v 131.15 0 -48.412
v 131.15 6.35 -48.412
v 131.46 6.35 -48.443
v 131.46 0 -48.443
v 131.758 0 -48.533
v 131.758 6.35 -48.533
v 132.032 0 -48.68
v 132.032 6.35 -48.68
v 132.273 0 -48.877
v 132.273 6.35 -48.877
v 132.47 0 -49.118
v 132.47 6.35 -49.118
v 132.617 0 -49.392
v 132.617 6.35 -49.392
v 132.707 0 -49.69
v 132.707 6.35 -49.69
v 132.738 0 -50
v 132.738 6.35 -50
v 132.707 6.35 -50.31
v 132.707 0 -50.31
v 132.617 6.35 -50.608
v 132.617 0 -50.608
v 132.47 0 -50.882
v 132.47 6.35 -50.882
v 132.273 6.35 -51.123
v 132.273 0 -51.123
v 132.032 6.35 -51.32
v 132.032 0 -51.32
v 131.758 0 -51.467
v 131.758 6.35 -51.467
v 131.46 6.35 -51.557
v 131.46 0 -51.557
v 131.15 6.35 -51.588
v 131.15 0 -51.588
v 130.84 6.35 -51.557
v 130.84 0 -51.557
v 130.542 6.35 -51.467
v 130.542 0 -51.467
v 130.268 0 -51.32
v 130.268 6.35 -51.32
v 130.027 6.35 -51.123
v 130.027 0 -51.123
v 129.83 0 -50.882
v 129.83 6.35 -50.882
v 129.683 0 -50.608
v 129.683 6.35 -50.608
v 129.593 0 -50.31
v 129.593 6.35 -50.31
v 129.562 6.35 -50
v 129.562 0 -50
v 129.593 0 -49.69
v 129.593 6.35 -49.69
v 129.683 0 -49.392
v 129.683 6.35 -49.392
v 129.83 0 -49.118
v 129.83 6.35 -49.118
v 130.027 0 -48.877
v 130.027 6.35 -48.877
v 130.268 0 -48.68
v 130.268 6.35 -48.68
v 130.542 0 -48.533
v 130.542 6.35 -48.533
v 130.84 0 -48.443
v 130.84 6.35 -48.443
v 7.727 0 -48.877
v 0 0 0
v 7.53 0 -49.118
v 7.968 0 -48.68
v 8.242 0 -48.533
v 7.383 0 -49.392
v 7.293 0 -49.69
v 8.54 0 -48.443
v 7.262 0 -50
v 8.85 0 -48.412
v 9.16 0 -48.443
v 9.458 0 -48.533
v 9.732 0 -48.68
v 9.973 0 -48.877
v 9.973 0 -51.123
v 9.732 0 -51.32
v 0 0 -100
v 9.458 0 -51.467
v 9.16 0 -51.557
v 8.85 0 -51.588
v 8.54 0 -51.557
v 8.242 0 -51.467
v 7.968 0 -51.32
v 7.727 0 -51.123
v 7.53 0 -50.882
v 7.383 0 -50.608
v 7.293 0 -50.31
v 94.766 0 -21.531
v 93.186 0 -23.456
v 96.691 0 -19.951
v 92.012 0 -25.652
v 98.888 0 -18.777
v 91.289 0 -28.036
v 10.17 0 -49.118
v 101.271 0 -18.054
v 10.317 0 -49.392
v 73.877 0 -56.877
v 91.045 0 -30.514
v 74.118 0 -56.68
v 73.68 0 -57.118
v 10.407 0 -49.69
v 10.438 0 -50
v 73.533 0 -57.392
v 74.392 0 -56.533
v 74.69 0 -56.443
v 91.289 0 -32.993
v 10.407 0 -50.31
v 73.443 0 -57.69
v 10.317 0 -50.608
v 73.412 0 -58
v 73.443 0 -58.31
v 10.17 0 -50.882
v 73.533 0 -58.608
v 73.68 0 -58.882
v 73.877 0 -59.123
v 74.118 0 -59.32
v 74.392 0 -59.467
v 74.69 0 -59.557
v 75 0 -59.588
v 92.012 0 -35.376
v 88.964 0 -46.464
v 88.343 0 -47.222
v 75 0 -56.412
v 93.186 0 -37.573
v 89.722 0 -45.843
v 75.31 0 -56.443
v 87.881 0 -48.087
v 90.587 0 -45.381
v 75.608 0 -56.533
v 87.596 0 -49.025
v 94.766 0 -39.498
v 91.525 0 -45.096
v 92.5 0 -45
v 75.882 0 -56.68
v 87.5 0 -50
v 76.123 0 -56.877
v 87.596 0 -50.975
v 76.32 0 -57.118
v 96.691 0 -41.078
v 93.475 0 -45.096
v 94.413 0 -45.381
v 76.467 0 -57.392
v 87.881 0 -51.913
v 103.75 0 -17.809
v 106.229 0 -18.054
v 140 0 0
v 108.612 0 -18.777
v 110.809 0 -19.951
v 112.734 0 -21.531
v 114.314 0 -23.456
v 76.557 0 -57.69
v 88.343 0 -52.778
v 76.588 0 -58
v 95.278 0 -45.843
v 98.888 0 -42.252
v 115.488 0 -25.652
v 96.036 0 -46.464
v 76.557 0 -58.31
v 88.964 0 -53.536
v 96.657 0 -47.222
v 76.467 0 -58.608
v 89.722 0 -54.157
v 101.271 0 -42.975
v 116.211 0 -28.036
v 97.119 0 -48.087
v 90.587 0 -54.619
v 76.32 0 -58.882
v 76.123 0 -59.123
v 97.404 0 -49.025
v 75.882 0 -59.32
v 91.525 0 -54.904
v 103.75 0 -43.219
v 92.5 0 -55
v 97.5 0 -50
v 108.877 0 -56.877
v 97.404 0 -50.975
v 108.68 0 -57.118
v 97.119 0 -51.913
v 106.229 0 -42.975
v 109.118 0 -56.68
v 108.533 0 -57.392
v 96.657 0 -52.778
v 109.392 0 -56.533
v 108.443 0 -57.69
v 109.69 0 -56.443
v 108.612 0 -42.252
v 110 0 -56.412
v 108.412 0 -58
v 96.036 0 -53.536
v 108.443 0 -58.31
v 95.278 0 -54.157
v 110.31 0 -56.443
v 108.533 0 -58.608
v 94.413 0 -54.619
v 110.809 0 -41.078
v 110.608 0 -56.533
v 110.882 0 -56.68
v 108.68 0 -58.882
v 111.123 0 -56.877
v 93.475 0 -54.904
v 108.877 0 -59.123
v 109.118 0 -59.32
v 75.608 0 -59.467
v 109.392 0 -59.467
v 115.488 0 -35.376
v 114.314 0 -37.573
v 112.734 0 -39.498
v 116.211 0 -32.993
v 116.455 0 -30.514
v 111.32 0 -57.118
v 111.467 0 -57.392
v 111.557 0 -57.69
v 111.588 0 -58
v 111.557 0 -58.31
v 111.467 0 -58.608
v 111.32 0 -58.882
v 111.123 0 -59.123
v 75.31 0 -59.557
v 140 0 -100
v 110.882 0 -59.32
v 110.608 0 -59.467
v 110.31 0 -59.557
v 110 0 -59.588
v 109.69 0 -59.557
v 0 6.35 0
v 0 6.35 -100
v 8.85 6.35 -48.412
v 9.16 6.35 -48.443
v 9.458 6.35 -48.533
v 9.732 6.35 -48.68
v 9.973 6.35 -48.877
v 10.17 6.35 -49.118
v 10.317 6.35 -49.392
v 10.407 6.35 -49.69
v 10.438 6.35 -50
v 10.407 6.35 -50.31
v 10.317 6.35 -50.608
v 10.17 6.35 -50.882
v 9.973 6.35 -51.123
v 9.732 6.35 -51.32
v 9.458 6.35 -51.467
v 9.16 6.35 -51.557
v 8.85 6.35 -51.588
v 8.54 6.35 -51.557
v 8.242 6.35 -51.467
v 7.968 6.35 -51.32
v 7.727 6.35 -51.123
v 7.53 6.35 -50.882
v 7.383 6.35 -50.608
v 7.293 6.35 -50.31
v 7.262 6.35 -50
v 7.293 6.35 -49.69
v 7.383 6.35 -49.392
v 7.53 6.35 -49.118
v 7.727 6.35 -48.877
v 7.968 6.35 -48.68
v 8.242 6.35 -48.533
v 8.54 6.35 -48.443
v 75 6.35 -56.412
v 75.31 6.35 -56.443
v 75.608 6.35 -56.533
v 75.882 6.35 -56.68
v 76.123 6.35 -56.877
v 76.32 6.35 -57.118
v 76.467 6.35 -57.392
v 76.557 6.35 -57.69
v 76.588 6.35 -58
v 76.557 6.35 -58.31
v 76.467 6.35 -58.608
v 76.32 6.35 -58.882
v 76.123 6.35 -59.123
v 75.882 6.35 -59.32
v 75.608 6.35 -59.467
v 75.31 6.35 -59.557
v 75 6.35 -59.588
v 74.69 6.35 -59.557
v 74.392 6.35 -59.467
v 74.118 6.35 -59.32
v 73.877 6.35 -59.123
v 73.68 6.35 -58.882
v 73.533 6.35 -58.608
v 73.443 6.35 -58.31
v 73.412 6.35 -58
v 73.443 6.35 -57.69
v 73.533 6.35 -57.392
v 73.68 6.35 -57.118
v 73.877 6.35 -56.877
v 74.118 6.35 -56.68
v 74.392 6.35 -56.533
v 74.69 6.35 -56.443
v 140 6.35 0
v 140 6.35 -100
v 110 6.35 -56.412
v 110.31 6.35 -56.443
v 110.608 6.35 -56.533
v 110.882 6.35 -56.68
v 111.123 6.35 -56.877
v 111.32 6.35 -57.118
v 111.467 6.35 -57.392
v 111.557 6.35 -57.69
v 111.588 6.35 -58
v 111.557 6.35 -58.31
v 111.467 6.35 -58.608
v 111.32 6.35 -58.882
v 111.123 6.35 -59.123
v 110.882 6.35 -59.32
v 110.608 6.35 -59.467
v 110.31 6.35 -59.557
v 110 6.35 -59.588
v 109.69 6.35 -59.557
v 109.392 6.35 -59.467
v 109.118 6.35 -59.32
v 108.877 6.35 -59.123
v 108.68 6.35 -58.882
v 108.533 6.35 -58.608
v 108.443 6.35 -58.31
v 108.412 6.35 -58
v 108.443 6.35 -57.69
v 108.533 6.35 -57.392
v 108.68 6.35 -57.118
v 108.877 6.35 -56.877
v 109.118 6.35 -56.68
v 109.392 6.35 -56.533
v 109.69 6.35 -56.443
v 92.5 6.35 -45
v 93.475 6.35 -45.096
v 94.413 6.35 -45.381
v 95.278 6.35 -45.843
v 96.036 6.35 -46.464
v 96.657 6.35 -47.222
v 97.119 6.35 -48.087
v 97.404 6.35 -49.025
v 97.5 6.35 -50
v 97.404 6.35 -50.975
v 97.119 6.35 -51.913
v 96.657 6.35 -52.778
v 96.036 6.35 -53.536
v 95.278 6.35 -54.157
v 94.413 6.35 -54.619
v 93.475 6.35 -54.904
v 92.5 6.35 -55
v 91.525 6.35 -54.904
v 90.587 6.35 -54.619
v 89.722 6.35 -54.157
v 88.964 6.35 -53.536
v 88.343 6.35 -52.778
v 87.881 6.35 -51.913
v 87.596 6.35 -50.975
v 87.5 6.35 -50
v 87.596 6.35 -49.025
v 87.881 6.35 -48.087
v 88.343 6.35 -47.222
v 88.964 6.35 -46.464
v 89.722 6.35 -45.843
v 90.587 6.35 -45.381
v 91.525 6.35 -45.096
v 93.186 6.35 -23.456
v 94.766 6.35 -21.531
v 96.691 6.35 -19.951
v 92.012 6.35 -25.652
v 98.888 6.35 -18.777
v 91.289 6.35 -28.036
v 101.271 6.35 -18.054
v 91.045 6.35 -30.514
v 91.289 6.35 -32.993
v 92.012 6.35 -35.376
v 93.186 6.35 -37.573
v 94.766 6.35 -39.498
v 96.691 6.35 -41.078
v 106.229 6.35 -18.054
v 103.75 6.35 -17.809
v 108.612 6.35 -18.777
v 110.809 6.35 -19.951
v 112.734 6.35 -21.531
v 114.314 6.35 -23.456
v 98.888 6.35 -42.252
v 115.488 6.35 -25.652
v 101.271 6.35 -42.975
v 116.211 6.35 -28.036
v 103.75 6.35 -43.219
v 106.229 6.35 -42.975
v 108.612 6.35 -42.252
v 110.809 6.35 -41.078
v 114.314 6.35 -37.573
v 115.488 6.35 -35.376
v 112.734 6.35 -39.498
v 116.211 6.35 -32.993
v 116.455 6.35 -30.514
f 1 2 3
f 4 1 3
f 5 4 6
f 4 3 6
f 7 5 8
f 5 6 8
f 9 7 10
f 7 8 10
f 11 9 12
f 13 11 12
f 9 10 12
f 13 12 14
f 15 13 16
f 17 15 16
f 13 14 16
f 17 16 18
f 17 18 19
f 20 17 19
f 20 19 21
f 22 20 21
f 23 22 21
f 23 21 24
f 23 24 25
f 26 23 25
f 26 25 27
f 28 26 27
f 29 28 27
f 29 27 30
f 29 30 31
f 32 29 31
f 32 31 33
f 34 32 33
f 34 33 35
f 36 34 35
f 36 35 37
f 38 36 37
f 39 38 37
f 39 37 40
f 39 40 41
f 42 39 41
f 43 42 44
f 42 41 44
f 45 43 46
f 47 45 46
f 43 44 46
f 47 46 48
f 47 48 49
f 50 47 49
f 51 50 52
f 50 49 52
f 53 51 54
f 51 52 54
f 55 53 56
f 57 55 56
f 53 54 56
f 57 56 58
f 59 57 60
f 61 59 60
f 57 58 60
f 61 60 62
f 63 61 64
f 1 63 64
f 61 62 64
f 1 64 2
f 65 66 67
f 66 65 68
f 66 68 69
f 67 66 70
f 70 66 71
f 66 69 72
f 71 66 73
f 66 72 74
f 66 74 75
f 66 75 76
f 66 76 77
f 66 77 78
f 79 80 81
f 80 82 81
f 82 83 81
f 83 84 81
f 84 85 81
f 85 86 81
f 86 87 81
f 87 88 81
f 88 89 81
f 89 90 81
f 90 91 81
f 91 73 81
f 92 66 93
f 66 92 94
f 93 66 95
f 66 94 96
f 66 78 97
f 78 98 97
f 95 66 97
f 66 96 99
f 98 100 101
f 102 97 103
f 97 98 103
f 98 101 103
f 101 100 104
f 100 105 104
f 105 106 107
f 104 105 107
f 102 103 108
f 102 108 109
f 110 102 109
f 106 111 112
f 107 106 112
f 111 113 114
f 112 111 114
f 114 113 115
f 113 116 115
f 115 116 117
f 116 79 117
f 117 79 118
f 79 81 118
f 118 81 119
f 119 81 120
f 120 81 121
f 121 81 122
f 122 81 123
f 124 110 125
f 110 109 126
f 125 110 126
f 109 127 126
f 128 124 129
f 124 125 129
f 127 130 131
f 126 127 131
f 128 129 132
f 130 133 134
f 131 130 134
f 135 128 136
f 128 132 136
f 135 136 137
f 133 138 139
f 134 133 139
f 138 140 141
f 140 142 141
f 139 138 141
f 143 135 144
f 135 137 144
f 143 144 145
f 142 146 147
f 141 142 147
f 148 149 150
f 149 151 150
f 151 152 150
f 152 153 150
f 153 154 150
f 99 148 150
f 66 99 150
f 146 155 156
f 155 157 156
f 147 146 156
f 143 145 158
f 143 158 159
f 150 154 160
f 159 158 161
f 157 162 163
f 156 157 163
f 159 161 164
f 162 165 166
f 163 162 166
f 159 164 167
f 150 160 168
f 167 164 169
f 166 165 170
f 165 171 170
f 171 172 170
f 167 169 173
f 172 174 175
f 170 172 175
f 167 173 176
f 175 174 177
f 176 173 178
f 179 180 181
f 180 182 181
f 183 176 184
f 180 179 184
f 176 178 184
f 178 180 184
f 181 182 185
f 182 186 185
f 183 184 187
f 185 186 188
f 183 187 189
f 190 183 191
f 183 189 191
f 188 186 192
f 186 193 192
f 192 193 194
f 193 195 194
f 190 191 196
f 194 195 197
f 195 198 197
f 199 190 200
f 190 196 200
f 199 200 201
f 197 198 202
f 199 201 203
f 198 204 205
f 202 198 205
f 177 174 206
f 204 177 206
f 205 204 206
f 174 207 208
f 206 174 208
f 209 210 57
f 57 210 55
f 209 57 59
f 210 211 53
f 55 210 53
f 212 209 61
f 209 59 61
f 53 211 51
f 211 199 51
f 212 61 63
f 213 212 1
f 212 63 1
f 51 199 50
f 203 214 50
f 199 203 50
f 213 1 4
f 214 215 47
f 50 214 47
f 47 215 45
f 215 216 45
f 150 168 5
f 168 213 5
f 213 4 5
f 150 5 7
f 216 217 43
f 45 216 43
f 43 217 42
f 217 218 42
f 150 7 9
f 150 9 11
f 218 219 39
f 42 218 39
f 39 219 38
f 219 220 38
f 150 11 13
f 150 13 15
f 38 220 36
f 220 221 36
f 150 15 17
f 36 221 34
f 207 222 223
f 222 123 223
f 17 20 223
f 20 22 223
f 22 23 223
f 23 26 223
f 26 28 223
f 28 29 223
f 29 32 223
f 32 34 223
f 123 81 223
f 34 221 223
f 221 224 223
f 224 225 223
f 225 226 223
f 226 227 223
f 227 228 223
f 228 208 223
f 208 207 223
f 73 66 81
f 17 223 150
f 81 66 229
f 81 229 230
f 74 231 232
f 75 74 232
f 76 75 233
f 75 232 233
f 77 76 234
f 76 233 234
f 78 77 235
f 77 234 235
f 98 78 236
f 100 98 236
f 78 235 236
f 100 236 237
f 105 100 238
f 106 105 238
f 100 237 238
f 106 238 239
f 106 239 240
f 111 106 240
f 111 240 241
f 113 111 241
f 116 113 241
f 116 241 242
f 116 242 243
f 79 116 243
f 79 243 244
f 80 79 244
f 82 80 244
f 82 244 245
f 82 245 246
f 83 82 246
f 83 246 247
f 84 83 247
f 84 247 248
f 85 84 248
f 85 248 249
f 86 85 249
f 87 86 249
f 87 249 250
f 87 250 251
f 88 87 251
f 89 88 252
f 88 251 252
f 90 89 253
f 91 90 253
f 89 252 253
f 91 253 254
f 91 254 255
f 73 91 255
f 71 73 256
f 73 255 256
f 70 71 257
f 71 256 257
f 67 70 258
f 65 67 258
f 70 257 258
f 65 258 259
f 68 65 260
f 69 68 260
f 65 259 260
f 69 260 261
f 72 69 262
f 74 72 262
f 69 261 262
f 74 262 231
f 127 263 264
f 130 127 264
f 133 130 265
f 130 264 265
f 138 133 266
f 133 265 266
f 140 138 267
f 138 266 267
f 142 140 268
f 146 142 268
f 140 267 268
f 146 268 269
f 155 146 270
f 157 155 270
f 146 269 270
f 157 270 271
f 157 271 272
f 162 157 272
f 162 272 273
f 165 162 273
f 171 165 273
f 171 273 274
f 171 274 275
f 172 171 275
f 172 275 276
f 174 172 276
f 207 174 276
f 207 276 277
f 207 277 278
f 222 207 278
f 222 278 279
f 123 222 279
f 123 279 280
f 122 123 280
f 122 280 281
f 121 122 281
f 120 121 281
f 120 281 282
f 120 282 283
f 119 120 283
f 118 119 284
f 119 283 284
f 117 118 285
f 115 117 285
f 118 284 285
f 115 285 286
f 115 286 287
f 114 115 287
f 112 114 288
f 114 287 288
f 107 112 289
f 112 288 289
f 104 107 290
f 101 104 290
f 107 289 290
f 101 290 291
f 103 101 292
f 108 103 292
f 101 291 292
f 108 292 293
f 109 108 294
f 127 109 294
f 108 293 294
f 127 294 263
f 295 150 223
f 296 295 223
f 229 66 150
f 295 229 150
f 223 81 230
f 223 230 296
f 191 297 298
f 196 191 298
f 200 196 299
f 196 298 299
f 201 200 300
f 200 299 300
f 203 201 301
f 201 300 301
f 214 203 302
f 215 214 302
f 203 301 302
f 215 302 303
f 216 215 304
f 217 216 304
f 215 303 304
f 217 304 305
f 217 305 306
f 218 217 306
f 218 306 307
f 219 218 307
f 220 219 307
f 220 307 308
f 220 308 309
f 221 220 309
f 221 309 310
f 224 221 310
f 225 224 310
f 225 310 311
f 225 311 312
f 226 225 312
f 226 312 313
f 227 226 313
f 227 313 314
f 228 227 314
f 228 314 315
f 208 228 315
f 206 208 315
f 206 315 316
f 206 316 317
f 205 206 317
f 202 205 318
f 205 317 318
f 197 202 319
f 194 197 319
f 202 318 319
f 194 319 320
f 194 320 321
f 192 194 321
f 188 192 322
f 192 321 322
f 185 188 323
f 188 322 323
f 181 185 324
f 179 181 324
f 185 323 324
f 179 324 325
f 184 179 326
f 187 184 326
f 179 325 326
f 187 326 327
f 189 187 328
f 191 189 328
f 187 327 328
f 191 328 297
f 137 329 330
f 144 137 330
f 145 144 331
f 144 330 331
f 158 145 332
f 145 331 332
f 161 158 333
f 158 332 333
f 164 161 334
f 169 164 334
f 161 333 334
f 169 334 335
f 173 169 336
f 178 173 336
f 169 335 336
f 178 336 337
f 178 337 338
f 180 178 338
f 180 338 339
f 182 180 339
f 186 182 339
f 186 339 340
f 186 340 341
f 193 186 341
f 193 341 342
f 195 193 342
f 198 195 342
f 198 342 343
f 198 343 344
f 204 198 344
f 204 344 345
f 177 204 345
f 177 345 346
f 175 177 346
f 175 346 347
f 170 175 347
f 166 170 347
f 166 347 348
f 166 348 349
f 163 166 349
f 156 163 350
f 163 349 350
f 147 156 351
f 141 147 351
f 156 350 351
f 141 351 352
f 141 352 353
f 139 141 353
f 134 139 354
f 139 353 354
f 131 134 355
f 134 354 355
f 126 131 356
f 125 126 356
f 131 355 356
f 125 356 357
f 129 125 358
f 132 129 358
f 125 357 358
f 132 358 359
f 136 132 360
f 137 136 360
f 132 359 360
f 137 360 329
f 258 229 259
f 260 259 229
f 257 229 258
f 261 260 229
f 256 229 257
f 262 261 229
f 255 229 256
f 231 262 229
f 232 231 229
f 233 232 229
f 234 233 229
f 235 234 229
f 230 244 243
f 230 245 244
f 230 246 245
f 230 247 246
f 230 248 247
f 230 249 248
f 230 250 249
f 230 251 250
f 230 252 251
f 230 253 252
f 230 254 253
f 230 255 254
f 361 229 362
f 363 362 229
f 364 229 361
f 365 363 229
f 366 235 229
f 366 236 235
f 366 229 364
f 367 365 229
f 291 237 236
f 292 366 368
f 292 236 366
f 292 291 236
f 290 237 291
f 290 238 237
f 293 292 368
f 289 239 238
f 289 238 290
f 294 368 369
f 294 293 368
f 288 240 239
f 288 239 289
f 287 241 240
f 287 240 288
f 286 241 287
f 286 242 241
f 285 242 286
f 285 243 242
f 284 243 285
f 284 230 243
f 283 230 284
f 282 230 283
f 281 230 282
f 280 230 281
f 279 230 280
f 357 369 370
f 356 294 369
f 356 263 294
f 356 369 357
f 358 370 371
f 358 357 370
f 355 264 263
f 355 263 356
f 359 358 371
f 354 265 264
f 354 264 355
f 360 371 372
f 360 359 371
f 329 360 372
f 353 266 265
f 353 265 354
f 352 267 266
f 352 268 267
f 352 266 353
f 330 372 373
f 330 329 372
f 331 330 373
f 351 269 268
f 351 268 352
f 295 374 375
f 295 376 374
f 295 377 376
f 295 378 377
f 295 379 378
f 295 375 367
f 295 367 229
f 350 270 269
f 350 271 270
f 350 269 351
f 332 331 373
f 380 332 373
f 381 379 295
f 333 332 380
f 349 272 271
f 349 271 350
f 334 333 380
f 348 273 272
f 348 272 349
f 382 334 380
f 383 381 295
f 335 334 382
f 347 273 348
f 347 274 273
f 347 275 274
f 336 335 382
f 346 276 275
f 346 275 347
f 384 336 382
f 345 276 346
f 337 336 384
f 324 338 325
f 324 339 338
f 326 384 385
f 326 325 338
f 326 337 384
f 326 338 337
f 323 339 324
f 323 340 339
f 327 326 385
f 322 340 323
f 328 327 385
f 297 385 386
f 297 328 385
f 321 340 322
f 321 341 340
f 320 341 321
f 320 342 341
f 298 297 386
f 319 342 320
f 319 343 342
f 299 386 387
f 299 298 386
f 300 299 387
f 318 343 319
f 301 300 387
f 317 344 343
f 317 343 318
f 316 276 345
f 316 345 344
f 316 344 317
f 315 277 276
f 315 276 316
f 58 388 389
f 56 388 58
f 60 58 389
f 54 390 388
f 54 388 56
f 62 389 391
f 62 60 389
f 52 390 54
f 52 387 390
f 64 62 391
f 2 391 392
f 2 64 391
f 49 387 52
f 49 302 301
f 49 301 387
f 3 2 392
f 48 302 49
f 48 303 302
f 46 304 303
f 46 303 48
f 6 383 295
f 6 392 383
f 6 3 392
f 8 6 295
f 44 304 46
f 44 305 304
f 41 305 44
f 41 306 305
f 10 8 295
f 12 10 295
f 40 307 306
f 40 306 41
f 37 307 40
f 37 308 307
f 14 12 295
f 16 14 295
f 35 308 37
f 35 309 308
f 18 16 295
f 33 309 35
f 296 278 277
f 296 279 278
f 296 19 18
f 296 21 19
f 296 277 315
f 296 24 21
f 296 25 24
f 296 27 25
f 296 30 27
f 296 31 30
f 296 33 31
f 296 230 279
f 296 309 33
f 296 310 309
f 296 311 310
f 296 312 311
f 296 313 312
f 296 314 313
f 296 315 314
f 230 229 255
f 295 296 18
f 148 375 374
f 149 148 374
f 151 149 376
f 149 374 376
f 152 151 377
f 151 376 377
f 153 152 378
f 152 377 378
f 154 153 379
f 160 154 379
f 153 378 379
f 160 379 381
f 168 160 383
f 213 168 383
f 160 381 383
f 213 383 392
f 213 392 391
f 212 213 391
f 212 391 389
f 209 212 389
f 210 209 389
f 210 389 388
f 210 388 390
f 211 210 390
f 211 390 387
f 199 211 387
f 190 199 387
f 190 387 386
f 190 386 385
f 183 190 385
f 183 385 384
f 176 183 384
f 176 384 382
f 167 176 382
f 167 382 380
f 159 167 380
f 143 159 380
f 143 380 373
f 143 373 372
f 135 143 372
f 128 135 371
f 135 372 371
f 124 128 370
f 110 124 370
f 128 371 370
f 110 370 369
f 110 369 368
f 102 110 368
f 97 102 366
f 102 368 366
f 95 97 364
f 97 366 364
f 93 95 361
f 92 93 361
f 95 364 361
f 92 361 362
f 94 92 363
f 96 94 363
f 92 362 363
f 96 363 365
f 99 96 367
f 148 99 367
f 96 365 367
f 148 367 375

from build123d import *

# Parameters (mm, degrees)
SKETCH1_W           = 140
SKETCH1_H           = 100
BOSS_EXTRUDE1_DEPTH = 6.35
SKETCH2_R           = 12.705
SKETCH2_R_2         = 5
CUT_EXTRUDE1_DEPTH  = 10
SKETCH3_R           = 1.5875
CUT_EXTRUDE2_DEPTH  = 10


with BuildPart() as part:
    # Sketch1 → Boss-Extrude1 (new body)
    with BuildSketch(Plane(origin=(0, 0, 0), x_dir=(1, 0, 0), z_dir=(0, 1, 0))):
        with Locations((70, 50)):
            Rectangle(SKETCH1_W, SKETCH1_H)
    extrude(amount=BOSS_EXTRUDE1_DEPTH)

    # Sketch2 → Cut-Extrude1 (cut)
    with BuildSketch(Plane(origin=(0, 6.35, 0), x_dir=(1, 0, 0), z_dir=(0, 1, 0))):
        with Locations(Location((103.75, 30.514428415, 0), (0, 0, 270))):
            Circle(SKETCH2_R)
        with Locations(Location((92.5, 50, 0), (0, 0, 270))):
            Circle(SKETCH2_R_2)
    extrude(amount=-CUT_EXTRUDE1_DEPTH, mode=Mode.SUBTRACT)

    # Sketch3 → Cut-Extrude2 (cut)
    with BuildSketch(Plane(origin=(0, 6.35, 0), x_dir=(1, 0, 0), z_dir=(0, 1, 0))):
        with Locations(Location((8.85, 50, 0), (0, 0, 270))):
            Circle(SKETCH3_R)
        with Locations(Location((131.15, 50, 0), (0, 0, 270))):
            Circle(SKETCH3_R)
        with Locations(Location((75, 58, 0), (0, 0, 270))):
            Circle(SKETCH3_R)
        with Locations(Location((110, 58, 0), (0, 0, 270))):
            Circle(SKETCH3_R)
    extrude(amount=-CUT_EXTRUDE2_DEPTH, mode=Mode.SUBTRACT)


solid = part.part
